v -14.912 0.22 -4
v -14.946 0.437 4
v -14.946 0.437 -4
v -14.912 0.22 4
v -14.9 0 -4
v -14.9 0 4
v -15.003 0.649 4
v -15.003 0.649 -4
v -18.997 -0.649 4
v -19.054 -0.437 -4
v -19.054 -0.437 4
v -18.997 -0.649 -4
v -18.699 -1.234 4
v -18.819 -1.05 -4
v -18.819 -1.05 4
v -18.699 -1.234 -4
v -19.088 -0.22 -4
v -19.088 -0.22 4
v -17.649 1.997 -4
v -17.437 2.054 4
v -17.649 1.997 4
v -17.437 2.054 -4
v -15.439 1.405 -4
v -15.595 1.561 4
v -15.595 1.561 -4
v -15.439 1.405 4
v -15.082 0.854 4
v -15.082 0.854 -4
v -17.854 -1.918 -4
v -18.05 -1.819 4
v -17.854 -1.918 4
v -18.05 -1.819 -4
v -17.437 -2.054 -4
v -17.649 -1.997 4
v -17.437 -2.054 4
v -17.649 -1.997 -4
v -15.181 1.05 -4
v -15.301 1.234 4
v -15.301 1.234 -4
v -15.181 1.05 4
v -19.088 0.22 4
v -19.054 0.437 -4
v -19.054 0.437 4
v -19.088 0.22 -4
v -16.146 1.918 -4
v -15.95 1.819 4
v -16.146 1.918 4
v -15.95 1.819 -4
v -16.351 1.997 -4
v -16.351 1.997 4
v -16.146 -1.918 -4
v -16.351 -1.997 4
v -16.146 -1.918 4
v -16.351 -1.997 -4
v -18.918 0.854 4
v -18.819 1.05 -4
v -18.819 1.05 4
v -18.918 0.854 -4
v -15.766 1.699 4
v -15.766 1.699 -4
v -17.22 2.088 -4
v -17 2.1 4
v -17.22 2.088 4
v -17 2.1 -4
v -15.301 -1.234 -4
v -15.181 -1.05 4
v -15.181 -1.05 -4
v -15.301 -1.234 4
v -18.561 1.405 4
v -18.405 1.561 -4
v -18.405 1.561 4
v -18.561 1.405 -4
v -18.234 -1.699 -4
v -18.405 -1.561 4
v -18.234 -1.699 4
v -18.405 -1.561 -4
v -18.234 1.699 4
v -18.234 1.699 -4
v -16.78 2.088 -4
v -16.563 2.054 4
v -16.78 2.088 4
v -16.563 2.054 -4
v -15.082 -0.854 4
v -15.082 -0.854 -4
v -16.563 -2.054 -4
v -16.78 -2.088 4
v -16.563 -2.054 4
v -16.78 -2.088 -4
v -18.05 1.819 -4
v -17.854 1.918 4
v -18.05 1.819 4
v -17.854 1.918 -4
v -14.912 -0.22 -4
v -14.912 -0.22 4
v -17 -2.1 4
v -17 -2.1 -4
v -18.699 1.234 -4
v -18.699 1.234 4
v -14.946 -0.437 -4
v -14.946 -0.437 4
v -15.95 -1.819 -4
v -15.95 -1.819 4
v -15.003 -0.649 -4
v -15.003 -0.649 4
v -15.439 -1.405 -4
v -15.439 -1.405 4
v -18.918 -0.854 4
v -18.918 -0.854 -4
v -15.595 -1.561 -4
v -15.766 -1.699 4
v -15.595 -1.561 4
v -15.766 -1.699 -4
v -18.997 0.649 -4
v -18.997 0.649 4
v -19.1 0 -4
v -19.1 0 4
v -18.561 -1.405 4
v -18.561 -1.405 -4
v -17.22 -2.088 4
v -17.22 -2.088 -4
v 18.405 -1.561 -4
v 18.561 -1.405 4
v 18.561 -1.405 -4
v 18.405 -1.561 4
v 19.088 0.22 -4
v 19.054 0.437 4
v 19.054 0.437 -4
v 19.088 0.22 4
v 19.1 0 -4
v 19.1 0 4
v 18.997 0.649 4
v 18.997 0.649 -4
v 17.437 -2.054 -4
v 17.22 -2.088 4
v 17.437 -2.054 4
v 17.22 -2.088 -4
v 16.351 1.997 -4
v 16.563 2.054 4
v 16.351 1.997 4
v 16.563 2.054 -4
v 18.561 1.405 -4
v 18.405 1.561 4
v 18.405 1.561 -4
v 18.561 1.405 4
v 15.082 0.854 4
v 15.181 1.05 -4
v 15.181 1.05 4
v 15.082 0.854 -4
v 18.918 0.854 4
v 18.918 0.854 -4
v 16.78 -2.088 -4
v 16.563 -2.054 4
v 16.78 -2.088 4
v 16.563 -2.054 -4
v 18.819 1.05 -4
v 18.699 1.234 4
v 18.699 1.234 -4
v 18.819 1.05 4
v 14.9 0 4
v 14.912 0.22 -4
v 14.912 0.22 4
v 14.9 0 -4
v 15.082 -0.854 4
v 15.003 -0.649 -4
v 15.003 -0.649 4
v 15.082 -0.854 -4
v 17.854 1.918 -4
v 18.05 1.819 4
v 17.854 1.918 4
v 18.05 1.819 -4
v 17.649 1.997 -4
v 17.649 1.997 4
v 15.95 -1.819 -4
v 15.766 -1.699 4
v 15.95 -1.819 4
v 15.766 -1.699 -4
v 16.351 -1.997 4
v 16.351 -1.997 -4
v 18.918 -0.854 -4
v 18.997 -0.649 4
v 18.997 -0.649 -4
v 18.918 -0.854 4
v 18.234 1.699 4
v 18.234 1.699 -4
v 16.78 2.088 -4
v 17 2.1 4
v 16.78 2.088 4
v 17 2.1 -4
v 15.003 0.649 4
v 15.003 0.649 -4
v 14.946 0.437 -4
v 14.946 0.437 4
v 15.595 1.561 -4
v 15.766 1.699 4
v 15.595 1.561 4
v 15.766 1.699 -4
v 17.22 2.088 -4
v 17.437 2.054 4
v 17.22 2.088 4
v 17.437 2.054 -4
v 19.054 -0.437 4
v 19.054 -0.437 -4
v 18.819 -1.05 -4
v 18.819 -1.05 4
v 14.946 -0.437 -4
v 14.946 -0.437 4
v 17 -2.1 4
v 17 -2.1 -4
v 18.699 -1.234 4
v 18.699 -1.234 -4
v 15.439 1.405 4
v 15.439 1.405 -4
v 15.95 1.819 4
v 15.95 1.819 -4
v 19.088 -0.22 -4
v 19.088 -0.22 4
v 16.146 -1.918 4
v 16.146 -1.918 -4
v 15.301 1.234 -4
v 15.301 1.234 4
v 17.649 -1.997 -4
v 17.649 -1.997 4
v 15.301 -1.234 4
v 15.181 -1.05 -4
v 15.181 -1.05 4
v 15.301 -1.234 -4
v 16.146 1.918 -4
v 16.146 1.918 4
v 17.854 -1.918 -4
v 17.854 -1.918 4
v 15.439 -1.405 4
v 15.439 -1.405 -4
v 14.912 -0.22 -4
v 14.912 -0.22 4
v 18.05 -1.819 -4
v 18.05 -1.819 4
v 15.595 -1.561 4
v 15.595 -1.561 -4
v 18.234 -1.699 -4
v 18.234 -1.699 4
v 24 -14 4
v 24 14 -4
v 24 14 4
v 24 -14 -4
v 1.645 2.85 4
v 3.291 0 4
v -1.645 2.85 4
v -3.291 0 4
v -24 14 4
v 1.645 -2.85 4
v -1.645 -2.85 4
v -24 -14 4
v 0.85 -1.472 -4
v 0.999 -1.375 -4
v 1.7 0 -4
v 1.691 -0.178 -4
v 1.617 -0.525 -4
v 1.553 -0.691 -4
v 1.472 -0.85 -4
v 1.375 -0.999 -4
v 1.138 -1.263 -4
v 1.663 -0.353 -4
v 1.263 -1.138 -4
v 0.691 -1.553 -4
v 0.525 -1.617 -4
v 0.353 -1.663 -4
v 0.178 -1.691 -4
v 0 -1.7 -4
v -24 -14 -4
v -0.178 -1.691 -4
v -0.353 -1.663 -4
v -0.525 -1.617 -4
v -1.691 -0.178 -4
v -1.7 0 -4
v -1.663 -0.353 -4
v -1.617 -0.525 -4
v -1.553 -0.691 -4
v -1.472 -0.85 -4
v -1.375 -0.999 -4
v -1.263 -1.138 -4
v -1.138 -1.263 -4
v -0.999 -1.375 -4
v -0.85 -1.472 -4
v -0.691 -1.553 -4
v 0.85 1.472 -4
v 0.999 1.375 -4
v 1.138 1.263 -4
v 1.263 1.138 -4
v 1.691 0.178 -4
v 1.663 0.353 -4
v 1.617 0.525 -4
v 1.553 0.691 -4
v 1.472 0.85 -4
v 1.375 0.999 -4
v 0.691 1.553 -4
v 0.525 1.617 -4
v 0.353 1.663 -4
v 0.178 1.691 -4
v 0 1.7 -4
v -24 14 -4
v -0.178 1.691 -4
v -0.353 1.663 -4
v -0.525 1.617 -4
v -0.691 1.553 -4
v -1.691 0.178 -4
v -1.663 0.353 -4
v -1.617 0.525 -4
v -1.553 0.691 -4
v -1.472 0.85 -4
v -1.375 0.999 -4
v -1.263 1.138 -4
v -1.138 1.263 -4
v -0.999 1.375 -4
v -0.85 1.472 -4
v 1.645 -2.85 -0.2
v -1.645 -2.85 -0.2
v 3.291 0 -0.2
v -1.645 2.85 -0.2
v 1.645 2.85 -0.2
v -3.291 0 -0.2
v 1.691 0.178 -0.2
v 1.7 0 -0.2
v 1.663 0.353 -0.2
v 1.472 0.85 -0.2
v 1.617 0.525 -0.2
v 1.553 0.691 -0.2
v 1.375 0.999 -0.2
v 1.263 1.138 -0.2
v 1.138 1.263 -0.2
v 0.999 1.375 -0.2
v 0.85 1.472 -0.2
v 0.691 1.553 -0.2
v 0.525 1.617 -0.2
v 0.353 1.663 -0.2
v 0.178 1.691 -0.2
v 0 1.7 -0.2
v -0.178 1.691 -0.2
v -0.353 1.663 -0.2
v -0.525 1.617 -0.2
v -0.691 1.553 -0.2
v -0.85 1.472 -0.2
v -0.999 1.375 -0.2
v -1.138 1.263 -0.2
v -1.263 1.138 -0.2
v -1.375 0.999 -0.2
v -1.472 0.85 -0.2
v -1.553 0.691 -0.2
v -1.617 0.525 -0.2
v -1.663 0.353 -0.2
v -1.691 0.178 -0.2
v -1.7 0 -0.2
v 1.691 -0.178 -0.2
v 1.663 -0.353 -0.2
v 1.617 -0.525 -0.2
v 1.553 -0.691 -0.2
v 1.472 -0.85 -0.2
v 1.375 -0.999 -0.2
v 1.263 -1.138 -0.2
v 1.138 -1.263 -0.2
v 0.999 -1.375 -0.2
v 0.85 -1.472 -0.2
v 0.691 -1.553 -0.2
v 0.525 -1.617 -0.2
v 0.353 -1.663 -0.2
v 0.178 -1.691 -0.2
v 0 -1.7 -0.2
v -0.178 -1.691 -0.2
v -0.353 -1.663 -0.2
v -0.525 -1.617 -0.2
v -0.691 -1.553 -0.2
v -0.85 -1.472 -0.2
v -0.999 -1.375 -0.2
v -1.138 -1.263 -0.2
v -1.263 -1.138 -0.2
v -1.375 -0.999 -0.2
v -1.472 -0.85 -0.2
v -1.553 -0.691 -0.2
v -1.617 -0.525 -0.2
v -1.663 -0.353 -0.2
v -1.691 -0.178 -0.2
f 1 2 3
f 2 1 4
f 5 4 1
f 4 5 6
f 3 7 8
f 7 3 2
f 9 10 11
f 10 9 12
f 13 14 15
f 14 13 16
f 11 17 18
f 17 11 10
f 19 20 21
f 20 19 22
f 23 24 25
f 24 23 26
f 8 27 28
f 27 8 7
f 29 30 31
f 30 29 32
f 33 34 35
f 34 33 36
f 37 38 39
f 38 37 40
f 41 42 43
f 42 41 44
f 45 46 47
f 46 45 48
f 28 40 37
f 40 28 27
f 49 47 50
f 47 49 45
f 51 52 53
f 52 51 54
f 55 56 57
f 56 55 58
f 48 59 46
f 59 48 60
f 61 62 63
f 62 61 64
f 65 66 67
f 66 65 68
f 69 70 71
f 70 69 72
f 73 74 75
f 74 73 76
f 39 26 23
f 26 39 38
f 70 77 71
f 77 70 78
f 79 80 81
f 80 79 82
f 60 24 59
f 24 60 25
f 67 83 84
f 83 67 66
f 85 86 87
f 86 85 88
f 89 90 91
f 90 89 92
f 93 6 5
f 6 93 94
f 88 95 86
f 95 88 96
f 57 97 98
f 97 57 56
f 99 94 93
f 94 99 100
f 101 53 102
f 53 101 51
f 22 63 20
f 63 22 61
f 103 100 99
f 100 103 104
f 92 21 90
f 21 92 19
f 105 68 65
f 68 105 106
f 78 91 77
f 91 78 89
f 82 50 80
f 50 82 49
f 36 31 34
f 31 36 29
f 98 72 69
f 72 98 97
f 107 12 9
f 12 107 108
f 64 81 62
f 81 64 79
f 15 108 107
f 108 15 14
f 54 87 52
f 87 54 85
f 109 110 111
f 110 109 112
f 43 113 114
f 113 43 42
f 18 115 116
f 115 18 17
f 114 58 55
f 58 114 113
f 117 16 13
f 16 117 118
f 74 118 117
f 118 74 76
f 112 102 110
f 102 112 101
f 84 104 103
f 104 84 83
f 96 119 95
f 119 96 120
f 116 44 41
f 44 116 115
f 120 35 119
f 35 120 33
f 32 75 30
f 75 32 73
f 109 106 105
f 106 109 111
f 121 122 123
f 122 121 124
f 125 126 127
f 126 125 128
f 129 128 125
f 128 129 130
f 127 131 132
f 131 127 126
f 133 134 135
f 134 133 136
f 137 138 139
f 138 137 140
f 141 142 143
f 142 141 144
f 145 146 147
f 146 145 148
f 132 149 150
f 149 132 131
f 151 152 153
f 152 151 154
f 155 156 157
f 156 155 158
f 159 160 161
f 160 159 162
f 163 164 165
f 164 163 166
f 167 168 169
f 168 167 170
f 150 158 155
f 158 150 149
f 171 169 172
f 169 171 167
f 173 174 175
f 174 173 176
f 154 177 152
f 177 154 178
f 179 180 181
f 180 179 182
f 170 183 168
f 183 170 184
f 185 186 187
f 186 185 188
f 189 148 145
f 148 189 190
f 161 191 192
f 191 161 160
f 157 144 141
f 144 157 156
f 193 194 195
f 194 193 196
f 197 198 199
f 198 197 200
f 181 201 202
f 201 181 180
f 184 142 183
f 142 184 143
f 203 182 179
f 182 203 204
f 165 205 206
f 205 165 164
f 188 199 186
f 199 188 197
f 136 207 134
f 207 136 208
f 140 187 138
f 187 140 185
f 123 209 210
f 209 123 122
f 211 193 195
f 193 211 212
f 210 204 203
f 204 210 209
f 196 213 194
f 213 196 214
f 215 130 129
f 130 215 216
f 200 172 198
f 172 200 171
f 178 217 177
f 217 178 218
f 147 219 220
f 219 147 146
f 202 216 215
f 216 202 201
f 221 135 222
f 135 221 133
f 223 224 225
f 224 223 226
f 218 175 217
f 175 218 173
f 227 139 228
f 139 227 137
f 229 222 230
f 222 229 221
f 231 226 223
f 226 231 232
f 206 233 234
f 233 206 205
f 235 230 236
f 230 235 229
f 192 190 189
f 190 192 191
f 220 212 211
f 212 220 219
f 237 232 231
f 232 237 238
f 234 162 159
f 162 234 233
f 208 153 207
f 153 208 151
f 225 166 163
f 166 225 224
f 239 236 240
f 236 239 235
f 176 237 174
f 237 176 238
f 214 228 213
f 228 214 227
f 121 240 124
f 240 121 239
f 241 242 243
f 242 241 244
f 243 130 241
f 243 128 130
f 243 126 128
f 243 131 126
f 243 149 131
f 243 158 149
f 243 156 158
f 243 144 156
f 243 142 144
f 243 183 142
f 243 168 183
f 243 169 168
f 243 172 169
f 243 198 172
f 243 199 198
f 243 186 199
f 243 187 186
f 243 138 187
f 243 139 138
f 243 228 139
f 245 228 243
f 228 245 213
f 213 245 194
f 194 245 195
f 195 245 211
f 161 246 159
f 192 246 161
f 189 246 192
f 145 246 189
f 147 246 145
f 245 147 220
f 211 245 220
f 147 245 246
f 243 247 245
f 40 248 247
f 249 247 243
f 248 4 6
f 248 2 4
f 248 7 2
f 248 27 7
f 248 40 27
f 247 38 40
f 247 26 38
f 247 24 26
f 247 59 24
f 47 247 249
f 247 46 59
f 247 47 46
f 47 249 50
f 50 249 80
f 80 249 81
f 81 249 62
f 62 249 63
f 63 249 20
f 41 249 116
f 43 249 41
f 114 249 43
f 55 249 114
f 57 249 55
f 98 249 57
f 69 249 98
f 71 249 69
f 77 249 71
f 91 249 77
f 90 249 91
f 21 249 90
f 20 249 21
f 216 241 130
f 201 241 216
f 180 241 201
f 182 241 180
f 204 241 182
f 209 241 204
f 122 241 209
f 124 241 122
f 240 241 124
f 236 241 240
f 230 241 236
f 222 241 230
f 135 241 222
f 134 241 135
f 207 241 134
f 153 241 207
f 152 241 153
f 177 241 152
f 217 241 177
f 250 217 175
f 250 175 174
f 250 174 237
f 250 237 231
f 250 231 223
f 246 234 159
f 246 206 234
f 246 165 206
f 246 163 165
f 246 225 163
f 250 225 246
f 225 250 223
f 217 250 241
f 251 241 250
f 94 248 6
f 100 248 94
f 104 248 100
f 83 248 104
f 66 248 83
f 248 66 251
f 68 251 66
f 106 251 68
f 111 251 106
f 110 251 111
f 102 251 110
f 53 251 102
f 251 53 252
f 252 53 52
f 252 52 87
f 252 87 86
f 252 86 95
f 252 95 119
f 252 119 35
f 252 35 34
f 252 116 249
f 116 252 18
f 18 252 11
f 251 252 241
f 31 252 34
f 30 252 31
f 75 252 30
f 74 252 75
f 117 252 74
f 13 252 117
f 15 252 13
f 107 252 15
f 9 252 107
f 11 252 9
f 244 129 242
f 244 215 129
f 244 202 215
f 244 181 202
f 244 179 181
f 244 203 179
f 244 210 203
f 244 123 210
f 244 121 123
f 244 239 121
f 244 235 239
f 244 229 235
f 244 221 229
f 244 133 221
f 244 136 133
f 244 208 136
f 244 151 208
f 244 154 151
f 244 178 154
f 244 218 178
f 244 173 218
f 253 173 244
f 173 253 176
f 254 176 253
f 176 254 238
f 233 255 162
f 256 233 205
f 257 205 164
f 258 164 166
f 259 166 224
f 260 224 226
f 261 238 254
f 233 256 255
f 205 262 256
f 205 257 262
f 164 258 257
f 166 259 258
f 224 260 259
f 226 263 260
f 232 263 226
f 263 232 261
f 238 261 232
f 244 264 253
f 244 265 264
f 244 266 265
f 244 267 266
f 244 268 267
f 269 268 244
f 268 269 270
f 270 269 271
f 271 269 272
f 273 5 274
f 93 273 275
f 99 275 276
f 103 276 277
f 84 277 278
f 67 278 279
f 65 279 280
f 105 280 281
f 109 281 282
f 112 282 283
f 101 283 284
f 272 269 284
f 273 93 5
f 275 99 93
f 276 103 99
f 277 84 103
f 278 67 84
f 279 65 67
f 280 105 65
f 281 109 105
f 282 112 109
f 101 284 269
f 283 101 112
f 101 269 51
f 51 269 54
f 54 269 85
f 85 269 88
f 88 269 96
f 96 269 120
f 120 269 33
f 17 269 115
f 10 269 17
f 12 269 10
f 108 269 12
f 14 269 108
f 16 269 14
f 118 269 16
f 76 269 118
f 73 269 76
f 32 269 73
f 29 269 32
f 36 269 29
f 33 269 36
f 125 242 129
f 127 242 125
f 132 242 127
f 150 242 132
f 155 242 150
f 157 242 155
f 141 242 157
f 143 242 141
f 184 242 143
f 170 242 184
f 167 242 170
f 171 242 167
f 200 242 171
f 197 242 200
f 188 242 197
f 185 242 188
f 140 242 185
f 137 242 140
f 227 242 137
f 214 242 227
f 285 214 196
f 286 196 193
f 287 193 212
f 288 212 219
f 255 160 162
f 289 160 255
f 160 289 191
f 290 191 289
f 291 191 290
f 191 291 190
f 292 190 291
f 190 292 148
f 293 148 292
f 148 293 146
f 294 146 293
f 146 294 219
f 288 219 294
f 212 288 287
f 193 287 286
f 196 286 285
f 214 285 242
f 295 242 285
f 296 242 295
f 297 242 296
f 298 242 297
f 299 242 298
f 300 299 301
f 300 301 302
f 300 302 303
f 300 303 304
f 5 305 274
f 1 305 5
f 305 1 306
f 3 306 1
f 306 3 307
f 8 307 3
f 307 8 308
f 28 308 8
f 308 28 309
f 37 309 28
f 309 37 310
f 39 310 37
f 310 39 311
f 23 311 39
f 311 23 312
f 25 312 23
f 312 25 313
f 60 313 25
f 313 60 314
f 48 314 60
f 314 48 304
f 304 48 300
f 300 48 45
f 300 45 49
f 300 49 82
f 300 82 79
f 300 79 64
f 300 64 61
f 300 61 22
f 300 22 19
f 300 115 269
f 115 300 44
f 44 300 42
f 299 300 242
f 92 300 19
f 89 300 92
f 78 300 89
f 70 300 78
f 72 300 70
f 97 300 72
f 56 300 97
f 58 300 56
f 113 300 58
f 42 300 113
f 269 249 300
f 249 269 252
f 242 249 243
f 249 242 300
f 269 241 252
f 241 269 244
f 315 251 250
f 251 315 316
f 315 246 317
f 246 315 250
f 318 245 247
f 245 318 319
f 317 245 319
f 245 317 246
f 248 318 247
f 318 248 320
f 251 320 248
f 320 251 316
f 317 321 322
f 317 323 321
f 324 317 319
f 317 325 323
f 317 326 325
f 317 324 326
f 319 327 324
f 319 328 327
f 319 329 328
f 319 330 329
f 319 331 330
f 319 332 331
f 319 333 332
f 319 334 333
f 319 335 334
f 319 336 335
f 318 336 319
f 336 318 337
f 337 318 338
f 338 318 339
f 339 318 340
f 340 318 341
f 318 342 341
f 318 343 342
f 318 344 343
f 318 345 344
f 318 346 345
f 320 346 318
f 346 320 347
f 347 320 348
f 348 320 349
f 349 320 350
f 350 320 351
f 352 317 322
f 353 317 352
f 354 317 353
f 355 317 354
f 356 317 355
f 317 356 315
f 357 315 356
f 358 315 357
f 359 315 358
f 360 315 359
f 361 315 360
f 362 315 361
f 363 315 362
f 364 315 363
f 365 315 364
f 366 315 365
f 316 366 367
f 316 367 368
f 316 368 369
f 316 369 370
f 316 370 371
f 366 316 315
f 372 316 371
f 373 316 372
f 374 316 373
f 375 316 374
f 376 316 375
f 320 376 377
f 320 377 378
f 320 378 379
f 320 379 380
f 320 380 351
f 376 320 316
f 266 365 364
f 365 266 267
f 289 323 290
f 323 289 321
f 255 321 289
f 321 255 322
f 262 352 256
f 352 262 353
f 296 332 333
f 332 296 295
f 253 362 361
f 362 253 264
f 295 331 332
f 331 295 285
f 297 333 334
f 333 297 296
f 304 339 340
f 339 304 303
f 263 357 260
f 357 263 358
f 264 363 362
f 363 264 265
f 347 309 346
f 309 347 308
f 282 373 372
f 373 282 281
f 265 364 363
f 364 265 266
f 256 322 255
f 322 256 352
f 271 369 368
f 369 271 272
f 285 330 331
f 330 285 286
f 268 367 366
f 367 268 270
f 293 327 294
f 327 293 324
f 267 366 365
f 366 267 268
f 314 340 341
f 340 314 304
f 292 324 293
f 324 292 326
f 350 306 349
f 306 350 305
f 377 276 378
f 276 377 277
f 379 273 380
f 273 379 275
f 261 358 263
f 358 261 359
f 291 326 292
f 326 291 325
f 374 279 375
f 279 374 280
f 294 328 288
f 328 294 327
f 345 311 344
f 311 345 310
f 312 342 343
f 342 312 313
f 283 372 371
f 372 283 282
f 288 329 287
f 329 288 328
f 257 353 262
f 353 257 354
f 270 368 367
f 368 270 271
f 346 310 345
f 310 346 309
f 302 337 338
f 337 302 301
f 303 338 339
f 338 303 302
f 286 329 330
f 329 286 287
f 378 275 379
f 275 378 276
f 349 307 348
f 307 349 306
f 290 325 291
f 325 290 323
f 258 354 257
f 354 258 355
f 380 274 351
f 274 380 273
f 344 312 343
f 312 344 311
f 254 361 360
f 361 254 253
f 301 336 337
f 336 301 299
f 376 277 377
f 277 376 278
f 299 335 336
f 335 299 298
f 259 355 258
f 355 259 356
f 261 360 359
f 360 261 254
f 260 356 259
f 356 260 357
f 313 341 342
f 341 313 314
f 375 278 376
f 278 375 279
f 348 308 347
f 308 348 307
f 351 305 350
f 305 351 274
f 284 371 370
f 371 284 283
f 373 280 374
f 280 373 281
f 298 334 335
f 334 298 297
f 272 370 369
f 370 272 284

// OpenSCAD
// M3 captive-nut plate: captive hex-nut mounting plate.
$fn = 60;
eps = 0.02;
plate_l = 48;
plate_w = 28;
plate_t = 8;
mount_pitch = 34;
mount_d = 4.2;
nut_flat = 5.7;
nut_depth = 4.2;
thread_clearance_d = 3.4;

// The hex pocket leaves at least 3.8 mm of material below the nut.
difference() {
    cube([plate_l, plate_w, plate_t], center = true);
    for (x = [-mount_pitch / 2, mount_pitch / 2])
        translate([x, 0, -plate_t / 2 - eps]) cylinder(d = mount_d, h = plate_t + 2 * eps);
    translate([0, 0, plate_t / 2 - nut_depth])
        cylinder(d = nut_flat / cos(30), h = nut_depth + eps, $fn = 6);
    translate([0, 0, -plate_t / 2 - eps])
        cylinder(d = thread_clearance_d, h = plate_t + 2 * eps);
}
